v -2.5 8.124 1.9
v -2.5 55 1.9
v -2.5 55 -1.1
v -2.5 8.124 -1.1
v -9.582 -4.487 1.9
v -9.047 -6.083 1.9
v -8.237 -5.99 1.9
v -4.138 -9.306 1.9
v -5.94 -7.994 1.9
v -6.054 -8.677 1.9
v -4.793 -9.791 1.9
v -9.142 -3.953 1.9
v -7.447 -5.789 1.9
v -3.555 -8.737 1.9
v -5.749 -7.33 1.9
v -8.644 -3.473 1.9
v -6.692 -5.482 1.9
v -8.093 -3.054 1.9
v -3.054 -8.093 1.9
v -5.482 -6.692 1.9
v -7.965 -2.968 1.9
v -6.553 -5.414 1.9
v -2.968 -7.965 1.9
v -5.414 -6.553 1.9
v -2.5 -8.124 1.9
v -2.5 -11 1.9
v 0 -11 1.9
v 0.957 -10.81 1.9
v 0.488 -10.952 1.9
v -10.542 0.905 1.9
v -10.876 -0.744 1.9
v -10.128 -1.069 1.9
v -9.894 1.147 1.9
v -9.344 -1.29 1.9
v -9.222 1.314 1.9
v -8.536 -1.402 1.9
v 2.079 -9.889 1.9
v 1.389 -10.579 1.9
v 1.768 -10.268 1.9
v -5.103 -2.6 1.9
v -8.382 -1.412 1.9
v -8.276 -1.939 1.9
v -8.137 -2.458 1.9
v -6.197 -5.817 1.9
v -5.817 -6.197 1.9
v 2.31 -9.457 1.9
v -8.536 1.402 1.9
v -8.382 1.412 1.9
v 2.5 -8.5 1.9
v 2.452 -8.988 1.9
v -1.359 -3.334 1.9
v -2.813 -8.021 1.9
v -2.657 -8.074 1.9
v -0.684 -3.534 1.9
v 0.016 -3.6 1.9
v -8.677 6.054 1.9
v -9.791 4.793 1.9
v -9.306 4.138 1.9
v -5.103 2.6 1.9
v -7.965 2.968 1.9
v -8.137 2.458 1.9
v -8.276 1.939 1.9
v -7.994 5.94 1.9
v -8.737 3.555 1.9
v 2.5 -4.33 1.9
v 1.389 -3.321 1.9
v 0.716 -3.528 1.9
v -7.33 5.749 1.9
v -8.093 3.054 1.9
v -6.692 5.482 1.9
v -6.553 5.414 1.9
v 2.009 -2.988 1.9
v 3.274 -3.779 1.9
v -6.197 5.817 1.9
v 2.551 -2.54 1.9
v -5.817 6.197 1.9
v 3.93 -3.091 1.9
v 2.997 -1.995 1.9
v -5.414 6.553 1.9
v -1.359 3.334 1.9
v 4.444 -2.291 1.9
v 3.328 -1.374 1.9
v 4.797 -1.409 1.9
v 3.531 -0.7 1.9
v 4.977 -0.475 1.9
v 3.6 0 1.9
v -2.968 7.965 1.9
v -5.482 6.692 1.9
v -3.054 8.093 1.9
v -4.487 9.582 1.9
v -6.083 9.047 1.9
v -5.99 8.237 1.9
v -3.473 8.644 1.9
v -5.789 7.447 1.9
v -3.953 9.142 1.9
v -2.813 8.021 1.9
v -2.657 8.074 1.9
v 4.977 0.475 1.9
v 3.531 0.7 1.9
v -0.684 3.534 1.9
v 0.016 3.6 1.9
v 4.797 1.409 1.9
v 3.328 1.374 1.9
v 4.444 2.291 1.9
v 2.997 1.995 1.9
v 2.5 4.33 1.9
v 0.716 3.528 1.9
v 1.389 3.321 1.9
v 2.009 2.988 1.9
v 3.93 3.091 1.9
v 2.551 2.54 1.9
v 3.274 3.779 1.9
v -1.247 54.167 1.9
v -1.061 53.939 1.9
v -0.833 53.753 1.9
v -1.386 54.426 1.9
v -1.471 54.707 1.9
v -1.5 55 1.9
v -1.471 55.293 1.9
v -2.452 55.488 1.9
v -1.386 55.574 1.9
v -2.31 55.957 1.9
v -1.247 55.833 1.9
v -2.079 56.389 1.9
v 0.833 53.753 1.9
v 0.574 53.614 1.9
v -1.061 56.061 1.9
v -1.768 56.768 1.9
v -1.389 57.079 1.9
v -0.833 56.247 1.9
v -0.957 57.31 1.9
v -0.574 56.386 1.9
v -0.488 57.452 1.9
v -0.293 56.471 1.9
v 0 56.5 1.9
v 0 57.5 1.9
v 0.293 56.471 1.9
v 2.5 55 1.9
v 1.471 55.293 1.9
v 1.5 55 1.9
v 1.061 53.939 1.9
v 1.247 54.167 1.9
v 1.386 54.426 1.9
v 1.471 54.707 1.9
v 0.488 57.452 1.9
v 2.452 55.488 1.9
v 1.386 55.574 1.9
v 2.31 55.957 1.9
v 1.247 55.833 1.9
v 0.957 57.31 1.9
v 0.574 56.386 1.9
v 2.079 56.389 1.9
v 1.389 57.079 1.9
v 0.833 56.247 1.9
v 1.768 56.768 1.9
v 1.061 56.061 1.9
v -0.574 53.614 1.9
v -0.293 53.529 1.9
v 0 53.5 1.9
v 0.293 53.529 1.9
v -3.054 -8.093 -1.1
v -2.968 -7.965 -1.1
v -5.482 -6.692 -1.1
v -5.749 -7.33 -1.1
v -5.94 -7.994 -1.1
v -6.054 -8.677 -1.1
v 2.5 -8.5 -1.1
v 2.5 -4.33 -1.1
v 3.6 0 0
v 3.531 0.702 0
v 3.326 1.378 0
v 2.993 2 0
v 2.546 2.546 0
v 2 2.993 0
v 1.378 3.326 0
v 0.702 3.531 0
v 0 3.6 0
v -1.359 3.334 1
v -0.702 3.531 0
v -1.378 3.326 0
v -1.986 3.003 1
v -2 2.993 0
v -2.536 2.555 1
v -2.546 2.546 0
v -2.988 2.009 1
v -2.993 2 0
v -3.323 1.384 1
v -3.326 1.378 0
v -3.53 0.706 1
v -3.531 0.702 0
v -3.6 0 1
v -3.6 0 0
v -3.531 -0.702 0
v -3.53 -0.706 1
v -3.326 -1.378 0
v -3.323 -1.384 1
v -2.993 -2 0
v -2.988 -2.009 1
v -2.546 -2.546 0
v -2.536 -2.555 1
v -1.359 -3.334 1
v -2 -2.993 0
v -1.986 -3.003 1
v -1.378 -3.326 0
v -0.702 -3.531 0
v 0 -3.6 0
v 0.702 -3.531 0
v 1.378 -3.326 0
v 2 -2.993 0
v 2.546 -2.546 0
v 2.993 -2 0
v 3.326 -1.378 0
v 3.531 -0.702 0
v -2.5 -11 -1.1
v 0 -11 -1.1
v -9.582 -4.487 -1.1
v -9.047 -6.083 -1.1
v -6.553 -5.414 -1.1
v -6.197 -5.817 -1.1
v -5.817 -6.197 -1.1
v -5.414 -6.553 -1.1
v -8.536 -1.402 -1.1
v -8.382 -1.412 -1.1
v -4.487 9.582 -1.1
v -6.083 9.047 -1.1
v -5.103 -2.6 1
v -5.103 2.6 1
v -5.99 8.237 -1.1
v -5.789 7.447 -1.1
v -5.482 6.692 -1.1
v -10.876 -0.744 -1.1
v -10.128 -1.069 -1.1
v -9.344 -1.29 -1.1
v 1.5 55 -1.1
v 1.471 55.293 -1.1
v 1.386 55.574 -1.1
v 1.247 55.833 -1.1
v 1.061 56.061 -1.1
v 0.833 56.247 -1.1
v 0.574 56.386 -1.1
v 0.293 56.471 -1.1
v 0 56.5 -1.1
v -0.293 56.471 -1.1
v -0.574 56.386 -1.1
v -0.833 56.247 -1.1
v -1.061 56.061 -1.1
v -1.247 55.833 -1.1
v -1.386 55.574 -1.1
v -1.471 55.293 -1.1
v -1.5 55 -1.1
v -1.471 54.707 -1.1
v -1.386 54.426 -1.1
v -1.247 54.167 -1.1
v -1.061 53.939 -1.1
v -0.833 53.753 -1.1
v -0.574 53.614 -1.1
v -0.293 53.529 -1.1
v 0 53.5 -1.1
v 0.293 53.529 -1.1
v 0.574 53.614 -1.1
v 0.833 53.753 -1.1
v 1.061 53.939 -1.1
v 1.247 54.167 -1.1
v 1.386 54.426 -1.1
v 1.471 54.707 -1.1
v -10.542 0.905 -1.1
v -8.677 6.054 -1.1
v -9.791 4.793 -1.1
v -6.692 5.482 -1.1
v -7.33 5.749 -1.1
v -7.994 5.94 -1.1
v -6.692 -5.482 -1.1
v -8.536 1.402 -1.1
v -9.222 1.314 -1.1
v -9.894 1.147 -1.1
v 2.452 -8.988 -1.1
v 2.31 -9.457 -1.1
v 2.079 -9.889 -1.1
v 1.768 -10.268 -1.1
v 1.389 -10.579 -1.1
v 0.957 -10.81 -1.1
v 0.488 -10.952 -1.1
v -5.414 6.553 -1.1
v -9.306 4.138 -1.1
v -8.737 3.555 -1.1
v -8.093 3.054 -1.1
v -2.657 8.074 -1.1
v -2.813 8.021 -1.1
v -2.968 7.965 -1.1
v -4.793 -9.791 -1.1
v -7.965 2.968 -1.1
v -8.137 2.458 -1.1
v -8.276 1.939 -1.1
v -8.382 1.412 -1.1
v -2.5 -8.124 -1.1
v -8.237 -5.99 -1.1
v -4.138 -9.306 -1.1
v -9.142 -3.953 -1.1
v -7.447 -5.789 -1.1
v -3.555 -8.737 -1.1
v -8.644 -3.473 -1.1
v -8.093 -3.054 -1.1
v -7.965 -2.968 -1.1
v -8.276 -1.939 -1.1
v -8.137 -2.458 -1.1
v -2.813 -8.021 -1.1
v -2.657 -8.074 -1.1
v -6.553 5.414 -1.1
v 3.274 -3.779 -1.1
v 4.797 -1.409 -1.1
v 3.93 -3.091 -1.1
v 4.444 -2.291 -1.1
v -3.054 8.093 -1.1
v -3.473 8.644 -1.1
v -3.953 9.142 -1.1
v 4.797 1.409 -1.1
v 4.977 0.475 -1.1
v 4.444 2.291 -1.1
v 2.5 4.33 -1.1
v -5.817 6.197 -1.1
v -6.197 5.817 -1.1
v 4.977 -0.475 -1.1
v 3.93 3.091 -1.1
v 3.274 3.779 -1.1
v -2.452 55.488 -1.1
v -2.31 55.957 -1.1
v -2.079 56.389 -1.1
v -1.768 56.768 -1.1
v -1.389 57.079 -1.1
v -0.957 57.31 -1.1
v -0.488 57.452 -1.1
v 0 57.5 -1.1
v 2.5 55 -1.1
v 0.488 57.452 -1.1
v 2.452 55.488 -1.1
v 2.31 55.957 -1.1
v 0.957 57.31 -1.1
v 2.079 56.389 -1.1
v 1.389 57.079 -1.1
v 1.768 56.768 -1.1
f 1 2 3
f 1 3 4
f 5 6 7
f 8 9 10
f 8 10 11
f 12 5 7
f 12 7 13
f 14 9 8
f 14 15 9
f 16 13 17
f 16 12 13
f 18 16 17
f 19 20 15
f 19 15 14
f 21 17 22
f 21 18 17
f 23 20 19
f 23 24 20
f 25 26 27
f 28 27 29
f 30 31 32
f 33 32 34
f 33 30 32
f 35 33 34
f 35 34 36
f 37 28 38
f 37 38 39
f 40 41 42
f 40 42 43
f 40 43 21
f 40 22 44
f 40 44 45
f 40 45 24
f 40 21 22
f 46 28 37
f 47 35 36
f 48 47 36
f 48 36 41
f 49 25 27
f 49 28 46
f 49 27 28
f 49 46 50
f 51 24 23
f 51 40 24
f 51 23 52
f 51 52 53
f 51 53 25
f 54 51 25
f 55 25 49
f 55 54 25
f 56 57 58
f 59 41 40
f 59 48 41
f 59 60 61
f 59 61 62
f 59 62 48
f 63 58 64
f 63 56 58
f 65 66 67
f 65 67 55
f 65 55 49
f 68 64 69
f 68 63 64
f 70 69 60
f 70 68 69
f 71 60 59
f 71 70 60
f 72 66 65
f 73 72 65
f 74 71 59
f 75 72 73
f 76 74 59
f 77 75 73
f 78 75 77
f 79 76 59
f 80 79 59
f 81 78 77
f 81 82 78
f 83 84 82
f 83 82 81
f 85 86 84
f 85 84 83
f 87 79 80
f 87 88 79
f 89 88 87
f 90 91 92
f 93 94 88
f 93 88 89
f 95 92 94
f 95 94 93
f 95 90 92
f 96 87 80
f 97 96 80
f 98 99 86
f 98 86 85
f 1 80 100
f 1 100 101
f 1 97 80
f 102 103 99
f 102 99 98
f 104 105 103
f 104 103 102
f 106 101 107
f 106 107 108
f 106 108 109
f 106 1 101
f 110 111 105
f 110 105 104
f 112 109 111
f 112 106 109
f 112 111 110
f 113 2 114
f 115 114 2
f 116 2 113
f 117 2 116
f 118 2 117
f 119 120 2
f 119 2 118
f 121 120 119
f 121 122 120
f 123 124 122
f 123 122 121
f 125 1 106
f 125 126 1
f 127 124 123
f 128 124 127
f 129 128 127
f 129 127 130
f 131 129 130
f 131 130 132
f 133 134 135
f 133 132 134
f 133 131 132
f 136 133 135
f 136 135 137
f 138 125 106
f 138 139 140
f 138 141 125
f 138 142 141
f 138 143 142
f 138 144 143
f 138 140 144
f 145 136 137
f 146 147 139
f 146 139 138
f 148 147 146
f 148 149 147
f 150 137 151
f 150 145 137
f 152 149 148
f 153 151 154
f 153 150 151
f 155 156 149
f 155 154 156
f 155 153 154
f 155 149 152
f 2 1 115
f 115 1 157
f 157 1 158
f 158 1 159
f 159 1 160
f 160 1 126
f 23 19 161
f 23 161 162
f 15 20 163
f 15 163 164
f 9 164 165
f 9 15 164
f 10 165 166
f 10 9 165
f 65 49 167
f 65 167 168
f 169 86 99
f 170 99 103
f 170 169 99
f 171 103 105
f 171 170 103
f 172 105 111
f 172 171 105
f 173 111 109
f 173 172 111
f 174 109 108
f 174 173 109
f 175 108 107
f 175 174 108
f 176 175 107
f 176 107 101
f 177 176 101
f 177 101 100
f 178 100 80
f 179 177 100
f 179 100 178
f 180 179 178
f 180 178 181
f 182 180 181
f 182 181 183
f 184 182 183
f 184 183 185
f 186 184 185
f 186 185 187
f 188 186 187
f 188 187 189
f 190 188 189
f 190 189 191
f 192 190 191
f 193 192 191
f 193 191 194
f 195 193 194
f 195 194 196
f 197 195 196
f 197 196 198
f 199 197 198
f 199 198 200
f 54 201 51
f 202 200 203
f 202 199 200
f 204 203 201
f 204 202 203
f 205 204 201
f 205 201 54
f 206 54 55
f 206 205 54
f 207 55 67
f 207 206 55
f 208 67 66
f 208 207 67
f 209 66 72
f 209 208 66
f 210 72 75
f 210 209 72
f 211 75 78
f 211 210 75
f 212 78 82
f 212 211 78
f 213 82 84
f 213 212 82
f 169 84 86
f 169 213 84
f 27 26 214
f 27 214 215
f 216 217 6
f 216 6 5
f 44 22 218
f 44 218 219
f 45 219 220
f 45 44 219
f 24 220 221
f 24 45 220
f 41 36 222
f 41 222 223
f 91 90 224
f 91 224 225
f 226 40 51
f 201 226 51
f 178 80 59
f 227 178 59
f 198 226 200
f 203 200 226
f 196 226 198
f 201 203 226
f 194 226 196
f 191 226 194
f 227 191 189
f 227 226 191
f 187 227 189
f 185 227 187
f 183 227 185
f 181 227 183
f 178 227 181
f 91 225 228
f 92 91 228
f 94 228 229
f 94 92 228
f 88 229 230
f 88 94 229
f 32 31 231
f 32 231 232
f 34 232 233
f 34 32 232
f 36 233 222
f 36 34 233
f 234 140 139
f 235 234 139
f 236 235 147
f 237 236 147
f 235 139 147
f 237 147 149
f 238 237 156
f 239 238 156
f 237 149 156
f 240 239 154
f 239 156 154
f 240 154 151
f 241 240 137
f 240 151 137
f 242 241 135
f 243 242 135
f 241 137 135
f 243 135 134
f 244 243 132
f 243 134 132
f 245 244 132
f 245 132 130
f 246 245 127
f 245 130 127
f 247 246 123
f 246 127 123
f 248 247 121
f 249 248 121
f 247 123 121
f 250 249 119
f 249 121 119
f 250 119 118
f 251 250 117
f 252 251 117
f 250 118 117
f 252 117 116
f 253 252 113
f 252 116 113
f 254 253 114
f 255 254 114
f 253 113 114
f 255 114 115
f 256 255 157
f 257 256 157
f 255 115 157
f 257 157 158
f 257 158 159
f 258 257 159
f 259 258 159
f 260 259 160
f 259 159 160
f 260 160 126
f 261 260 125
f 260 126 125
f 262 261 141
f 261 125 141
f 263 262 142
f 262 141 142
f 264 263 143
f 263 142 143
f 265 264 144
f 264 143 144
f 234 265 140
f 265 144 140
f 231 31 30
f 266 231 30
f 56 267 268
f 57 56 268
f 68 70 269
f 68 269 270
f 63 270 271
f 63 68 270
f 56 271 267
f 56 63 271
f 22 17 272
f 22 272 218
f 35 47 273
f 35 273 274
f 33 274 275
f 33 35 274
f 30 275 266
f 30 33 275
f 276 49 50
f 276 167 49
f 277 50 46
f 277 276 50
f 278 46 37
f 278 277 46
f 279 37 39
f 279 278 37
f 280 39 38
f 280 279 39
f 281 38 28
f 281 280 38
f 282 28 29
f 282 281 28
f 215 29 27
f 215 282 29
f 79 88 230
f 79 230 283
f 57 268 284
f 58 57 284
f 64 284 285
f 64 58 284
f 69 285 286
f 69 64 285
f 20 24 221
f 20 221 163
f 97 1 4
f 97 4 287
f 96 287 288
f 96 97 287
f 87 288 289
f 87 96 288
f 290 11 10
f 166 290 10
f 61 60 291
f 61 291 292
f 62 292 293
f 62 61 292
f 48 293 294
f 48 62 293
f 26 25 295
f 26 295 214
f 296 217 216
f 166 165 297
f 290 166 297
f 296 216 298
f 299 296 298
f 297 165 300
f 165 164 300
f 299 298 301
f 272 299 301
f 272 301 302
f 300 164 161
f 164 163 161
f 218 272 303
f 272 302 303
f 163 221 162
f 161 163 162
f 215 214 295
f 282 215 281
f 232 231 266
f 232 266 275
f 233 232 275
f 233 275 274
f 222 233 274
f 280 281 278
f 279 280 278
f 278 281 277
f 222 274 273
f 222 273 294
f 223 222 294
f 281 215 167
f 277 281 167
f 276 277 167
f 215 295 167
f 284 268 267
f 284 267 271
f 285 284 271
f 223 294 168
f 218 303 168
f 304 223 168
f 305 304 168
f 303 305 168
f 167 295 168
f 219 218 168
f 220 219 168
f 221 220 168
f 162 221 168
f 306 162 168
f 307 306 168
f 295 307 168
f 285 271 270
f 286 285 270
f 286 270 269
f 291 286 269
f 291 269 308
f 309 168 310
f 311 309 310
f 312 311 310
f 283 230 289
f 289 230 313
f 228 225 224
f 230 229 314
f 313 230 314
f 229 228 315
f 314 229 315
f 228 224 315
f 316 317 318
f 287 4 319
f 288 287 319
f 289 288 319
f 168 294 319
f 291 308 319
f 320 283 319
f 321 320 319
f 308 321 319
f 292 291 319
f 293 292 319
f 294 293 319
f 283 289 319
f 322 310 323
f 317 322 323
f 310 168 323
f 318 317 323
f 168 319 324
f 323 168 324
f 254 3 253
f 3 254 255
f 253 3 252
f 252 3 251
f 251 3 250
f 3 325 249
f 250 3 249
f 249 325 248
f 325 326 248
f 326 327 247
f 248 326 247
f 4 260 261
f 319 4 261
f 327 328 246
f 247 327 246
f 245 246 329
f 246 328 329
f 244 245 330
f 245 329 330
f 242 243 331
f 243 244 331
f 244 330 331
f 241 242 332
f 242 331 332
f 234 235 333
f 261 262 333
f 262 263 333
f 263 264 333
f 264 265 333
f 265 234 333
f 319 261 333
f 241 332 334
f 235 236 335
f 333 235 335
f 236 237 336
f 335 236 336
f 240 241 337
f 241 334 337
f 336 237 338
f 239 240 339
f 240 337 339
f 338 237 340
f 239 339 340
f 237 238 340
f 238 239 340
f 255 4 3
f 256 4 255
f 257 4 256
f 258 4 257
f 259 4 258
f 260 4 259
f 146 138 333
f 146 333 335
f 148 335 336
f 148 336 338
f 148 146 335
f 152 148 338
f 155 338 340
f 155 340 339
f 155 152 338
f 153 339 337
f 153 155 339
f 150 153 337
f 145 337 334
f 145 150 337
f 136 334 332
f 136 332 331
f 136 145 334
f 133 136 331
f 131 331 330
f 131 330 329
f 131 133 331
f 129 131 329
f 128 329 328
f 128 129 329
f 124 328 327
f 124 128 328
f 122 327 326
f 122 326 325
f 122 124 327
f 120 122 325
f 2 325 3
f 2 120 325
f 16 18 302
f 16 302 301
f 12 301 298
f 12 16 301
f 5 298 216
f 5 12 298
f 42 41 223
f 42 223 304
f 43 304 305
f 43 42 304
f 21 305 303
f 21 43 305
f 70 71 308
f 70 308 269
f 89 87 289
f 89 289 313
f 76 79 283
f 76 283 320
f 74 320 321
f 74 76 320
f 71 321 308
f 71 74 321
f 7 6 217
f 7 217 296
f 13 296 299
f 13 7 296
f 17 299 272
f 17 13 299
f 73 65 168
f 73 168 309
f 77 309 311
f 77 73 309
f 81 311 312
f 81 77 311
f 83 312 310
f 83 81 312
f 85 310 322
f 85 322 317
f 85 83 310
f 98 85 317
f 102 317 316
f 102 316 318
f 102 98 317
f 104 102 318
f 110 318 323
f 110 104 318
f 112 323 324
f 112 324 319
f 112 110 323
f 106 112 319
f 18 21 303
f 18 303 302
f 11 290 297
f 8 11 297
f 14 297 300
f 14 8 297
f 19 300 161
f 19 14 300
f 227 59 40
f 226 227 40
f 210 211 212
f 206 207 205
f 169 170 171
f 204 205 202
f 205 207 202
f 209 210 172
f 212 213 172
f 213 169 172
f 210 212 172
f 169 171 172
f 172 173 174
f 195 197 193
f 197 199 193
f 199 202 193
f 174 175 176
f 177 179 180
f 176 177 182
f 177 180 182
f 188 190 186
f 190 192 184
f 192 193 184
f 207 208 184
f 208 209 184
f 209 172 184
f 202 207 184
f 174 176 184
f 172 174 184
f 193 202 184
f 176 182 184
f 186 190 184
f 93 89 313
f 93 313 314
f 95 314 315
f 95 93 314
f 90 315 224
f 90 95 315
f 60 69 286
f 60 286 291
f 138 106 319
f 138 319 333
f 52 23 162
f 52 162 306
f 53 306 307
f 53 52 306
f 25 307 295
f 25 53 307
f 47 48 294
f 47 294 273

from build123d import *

# Parameters (mm, degrees)
SKETCH1_R           = 1.5
BOSS_EXTRUDE1_DEPTH = 3
CUT_EXTRUDE2_DEPTH  = 0.9
SKETCH5_W           = 3.6
SKETCH5_H           = 3
FILLET1_R           = 2.5


with BuildPart() as part:
    # Sketch1 → Boss-Extrude1 (new body)
    with BuildSketch(Plane.XY.offset(1.9)):
        with BuildLine():
            Line((2.5, -11), (2.5, -4.330127019))
            ThreePointArc((2.5, -4.330127019), (5, 0), (2.5, 4.330127019))
            Line((2.5, 4.330127019), (2.5, 55))
            ThreePointArc((2.5, 55), (0, 57.5), (-2.5, 55))
            Line((-2.5, 55), (-2.5, 8.124038405))
            ThreePointArc((-2.5, 8.124038405), (-2.735010245, 8.047963653), (-2.967710696, 7.965092167))
            Line((-2.967710696, 7.965092167), (-3.054167872, 8.093270203))
            ThreePointArc((-3.054167872, 8.093270203), (-4.342095244, 9.472160372), (-5.994566265, 10.382893341))
            ThreePointArc((-5.994566265, 10.382893341), (-6.032083889, 8.496444973), (-5.481893659, 6.691622066))
            Line((-5.481893659, 6.691622066), (-5.414116812, 6.552658937))
            ThreePointArc((-5.414116812, 6.552658937), (-6.01040764, 6.01040764), (-6.552658937, 5.414116812))
            Line((-6.552658937, 5.414116812), (-6.691622066, 5.481893659))
            ThreePointArc((-6.691622066, 5.481893659), (-8.496444973, 6.032083889), (-10.382893341, 5.994566265))
            ThreePointArc((-10.382893341, 5.994566265), (-9.472160372, 4.342095244), (-8.093270203, 3.054167872))
            Line((-8.093270203, 3.054167872), (-7.965092167, 2.967710696))
            ThreePointArc((-7.965092167, 2.967710696), (-8.210369523, 2.199961883), (-8.381827508, 1.41243323))
            Line((-8.381827508, 1.41243323), (-8.536061531, 1.401648136))
            ThreePointArc((-8.536061531, 1.401648136), (-10.374179133, 0.975715399), (-11.989132531, 0))
            ThreePointArc((-11.989132531, 0), (-10.374179133, -0.975715399), (-8.536061531, -1.401648136))
            Line((-8.536061531, -1.401648136), (-8.381827508, -1.41243323))
            ThreePointArc((-8.381827508, -1.41243323), (-8.210369523, -2.199961883), (-7.965092167, -2.967710696))
            Line((-7.965092167, -2.967710696), (-8.093270203, -3.054167872))
            ThreePointArc((-8.093270203, -3.054167872), (-9.472160372, -4.342095244), (-10.382893341, -5.994566265))
            ThreePointArc((-10.382893341, -5.994566265), (-8.496444973, -6.032083889), (-6.691622066, -5.481893659))
            Line((-6.691622066, -5.481893659), (-6.552658937, -5.414116812))
            ThreePointArc((-6.552658937, -5.414116812), (-6.01040764, -6.01040764), (-5.414116812, -6.552658937))
            Line((-5.414116812, -6.552658937), (-5.481893659, -6.691622066))
            ThreePointArc((-5.481893659, -6.691622066), (-6.032083889, -8.496444973), (-5.994566265, -10.382893341))
            ThreePointArc((-5.994566265, -10.382893341), (-4.342095244, -9.472160372), (-3.054167872, -8.093270203))
            Line((-3.054167872, -8.093270203), (-2.967710696, -7.965092167))
            ThreePointArc((-2.967710696, -7.965092167), (-2.735010245, -8.047963653), (-2.5, -8.124038405))
            Line((-2.5, -8.124038405), (-2.5, -11))
            Line((-2.5, -11), (2.5, -11))
        make_face()
        with Locations((0, 55)):
            Circle(SKETCH1_R, mode=Mode.SUBTRACT)
    extrude(amount=-BOSS_EXTRUDE1_DEPTH)

    # Sketch4 → Cut-Extrude2 (cut)
    with BuildSketch(Plane.XY.offset(1.9)):
        with BuildLine():
            Line((-5.102940329, -2.6), (-1.358771093, -3.333727811))
            ThreePointArc((-1.358771093, -3.333727811), (-3.6, 0), (-1.358771093, 3.333727811))
            Line((-1.358771093, 3.333727811), (-5.102940329, 2.6))
            Line((-5.102940329, 2.6), (-5.102940329, -2.6))
        make_face()
    extrude(amount=-CUT_EXTRUDE2_DEPTH, mode=Mode.SUBTRACT)

    # Sketch5 → Cut-Revolve1 (revolve, cut)
    with BuildSketch(Plane(origin=(0, 0, 0), x_dir=(1, 0, 0), z_dir=(0, 1, 0))):
        with Locations((1.8, -1.5)):
            Rectangle(SKETCH5_W, SKETCH5_H)
    revolve(axis=Axis((0, 0, 0), (0, 0, 1)), mode=Mode.SUBTRACT)

    # Chamfer1
    # the kernel refuses this chamfer: 1.996823512, 1.412365401 mm, written as the material it takes off along each edge
    with BuildSketch(Plane(origin=(-5.994566265, -10.382893341, 6.307600342), x_dir=(0.8971018613245074, 0.44182377754949315, 0), z_dir=(0, 0, -1)), Plane(origin=(-10.382893341, -5.994566265, 6.307600342), x_dir=(0.9978248904640776, -0.06592031530834441, 0), z_dir=(0, 0, -1)), Plane(origin=(-11.989132531, 0, 6.307600342), x_dir=(0.8311815460161414, -0.5560011129145489, 0), z_dir=(0, 0, -1))) as chamfer1_piece_1:
        with BuildLine():
            Line((1.33889649, 0), (0.700148491, -1.556942978))
            ThreePointArc((0.700148491, -1.556942978), (0.305807457, -0.828670891), (0, 0))
            ThreePointArc((0, 0), (0.684607685, 0.037444556), (1.33889649, 0))
        make_face()
    extrude(amount=11.815200684, mode=Mode.SUBTRACT)
    with BuildSketch(Plane(origin=(-10.382893341, 5.994566265, 6.307600342), x_dir=(0.9993864811320993, 0.035023725250178994, 0), z_dir=(0, 0, -1)), Plane(origin=(-5.994566265, 10.382893341, 6.307600342), x_dir=(0.883005943484212, -0.4693618047642527, 0), z_dir=(0, 0, -1))) as chamfer1_piece_2:
        with BuildLine():
            Line((1.707126049, 0), (0.549125448, 1.221108125))
            ThreePointArc((0.549125448, 1.221108125), (0.246629708, 0.639737105), (0, 0))
            ThreePointArc((0, 0), (0.881190909, -0.060960877), (1.707126049, 0))
        make_face()
    extrude(amount=11.815200684, mode=Mode.SUBTRACT)

    # Fillet1
    fillet1_edges = [part.edges().sort_by_distance(p)[0] for p in [
        (2.5, -11, 0.4),
    ]]
    fillet(fillet1_edges, radius=FILLET1_R)


solid = part.part
